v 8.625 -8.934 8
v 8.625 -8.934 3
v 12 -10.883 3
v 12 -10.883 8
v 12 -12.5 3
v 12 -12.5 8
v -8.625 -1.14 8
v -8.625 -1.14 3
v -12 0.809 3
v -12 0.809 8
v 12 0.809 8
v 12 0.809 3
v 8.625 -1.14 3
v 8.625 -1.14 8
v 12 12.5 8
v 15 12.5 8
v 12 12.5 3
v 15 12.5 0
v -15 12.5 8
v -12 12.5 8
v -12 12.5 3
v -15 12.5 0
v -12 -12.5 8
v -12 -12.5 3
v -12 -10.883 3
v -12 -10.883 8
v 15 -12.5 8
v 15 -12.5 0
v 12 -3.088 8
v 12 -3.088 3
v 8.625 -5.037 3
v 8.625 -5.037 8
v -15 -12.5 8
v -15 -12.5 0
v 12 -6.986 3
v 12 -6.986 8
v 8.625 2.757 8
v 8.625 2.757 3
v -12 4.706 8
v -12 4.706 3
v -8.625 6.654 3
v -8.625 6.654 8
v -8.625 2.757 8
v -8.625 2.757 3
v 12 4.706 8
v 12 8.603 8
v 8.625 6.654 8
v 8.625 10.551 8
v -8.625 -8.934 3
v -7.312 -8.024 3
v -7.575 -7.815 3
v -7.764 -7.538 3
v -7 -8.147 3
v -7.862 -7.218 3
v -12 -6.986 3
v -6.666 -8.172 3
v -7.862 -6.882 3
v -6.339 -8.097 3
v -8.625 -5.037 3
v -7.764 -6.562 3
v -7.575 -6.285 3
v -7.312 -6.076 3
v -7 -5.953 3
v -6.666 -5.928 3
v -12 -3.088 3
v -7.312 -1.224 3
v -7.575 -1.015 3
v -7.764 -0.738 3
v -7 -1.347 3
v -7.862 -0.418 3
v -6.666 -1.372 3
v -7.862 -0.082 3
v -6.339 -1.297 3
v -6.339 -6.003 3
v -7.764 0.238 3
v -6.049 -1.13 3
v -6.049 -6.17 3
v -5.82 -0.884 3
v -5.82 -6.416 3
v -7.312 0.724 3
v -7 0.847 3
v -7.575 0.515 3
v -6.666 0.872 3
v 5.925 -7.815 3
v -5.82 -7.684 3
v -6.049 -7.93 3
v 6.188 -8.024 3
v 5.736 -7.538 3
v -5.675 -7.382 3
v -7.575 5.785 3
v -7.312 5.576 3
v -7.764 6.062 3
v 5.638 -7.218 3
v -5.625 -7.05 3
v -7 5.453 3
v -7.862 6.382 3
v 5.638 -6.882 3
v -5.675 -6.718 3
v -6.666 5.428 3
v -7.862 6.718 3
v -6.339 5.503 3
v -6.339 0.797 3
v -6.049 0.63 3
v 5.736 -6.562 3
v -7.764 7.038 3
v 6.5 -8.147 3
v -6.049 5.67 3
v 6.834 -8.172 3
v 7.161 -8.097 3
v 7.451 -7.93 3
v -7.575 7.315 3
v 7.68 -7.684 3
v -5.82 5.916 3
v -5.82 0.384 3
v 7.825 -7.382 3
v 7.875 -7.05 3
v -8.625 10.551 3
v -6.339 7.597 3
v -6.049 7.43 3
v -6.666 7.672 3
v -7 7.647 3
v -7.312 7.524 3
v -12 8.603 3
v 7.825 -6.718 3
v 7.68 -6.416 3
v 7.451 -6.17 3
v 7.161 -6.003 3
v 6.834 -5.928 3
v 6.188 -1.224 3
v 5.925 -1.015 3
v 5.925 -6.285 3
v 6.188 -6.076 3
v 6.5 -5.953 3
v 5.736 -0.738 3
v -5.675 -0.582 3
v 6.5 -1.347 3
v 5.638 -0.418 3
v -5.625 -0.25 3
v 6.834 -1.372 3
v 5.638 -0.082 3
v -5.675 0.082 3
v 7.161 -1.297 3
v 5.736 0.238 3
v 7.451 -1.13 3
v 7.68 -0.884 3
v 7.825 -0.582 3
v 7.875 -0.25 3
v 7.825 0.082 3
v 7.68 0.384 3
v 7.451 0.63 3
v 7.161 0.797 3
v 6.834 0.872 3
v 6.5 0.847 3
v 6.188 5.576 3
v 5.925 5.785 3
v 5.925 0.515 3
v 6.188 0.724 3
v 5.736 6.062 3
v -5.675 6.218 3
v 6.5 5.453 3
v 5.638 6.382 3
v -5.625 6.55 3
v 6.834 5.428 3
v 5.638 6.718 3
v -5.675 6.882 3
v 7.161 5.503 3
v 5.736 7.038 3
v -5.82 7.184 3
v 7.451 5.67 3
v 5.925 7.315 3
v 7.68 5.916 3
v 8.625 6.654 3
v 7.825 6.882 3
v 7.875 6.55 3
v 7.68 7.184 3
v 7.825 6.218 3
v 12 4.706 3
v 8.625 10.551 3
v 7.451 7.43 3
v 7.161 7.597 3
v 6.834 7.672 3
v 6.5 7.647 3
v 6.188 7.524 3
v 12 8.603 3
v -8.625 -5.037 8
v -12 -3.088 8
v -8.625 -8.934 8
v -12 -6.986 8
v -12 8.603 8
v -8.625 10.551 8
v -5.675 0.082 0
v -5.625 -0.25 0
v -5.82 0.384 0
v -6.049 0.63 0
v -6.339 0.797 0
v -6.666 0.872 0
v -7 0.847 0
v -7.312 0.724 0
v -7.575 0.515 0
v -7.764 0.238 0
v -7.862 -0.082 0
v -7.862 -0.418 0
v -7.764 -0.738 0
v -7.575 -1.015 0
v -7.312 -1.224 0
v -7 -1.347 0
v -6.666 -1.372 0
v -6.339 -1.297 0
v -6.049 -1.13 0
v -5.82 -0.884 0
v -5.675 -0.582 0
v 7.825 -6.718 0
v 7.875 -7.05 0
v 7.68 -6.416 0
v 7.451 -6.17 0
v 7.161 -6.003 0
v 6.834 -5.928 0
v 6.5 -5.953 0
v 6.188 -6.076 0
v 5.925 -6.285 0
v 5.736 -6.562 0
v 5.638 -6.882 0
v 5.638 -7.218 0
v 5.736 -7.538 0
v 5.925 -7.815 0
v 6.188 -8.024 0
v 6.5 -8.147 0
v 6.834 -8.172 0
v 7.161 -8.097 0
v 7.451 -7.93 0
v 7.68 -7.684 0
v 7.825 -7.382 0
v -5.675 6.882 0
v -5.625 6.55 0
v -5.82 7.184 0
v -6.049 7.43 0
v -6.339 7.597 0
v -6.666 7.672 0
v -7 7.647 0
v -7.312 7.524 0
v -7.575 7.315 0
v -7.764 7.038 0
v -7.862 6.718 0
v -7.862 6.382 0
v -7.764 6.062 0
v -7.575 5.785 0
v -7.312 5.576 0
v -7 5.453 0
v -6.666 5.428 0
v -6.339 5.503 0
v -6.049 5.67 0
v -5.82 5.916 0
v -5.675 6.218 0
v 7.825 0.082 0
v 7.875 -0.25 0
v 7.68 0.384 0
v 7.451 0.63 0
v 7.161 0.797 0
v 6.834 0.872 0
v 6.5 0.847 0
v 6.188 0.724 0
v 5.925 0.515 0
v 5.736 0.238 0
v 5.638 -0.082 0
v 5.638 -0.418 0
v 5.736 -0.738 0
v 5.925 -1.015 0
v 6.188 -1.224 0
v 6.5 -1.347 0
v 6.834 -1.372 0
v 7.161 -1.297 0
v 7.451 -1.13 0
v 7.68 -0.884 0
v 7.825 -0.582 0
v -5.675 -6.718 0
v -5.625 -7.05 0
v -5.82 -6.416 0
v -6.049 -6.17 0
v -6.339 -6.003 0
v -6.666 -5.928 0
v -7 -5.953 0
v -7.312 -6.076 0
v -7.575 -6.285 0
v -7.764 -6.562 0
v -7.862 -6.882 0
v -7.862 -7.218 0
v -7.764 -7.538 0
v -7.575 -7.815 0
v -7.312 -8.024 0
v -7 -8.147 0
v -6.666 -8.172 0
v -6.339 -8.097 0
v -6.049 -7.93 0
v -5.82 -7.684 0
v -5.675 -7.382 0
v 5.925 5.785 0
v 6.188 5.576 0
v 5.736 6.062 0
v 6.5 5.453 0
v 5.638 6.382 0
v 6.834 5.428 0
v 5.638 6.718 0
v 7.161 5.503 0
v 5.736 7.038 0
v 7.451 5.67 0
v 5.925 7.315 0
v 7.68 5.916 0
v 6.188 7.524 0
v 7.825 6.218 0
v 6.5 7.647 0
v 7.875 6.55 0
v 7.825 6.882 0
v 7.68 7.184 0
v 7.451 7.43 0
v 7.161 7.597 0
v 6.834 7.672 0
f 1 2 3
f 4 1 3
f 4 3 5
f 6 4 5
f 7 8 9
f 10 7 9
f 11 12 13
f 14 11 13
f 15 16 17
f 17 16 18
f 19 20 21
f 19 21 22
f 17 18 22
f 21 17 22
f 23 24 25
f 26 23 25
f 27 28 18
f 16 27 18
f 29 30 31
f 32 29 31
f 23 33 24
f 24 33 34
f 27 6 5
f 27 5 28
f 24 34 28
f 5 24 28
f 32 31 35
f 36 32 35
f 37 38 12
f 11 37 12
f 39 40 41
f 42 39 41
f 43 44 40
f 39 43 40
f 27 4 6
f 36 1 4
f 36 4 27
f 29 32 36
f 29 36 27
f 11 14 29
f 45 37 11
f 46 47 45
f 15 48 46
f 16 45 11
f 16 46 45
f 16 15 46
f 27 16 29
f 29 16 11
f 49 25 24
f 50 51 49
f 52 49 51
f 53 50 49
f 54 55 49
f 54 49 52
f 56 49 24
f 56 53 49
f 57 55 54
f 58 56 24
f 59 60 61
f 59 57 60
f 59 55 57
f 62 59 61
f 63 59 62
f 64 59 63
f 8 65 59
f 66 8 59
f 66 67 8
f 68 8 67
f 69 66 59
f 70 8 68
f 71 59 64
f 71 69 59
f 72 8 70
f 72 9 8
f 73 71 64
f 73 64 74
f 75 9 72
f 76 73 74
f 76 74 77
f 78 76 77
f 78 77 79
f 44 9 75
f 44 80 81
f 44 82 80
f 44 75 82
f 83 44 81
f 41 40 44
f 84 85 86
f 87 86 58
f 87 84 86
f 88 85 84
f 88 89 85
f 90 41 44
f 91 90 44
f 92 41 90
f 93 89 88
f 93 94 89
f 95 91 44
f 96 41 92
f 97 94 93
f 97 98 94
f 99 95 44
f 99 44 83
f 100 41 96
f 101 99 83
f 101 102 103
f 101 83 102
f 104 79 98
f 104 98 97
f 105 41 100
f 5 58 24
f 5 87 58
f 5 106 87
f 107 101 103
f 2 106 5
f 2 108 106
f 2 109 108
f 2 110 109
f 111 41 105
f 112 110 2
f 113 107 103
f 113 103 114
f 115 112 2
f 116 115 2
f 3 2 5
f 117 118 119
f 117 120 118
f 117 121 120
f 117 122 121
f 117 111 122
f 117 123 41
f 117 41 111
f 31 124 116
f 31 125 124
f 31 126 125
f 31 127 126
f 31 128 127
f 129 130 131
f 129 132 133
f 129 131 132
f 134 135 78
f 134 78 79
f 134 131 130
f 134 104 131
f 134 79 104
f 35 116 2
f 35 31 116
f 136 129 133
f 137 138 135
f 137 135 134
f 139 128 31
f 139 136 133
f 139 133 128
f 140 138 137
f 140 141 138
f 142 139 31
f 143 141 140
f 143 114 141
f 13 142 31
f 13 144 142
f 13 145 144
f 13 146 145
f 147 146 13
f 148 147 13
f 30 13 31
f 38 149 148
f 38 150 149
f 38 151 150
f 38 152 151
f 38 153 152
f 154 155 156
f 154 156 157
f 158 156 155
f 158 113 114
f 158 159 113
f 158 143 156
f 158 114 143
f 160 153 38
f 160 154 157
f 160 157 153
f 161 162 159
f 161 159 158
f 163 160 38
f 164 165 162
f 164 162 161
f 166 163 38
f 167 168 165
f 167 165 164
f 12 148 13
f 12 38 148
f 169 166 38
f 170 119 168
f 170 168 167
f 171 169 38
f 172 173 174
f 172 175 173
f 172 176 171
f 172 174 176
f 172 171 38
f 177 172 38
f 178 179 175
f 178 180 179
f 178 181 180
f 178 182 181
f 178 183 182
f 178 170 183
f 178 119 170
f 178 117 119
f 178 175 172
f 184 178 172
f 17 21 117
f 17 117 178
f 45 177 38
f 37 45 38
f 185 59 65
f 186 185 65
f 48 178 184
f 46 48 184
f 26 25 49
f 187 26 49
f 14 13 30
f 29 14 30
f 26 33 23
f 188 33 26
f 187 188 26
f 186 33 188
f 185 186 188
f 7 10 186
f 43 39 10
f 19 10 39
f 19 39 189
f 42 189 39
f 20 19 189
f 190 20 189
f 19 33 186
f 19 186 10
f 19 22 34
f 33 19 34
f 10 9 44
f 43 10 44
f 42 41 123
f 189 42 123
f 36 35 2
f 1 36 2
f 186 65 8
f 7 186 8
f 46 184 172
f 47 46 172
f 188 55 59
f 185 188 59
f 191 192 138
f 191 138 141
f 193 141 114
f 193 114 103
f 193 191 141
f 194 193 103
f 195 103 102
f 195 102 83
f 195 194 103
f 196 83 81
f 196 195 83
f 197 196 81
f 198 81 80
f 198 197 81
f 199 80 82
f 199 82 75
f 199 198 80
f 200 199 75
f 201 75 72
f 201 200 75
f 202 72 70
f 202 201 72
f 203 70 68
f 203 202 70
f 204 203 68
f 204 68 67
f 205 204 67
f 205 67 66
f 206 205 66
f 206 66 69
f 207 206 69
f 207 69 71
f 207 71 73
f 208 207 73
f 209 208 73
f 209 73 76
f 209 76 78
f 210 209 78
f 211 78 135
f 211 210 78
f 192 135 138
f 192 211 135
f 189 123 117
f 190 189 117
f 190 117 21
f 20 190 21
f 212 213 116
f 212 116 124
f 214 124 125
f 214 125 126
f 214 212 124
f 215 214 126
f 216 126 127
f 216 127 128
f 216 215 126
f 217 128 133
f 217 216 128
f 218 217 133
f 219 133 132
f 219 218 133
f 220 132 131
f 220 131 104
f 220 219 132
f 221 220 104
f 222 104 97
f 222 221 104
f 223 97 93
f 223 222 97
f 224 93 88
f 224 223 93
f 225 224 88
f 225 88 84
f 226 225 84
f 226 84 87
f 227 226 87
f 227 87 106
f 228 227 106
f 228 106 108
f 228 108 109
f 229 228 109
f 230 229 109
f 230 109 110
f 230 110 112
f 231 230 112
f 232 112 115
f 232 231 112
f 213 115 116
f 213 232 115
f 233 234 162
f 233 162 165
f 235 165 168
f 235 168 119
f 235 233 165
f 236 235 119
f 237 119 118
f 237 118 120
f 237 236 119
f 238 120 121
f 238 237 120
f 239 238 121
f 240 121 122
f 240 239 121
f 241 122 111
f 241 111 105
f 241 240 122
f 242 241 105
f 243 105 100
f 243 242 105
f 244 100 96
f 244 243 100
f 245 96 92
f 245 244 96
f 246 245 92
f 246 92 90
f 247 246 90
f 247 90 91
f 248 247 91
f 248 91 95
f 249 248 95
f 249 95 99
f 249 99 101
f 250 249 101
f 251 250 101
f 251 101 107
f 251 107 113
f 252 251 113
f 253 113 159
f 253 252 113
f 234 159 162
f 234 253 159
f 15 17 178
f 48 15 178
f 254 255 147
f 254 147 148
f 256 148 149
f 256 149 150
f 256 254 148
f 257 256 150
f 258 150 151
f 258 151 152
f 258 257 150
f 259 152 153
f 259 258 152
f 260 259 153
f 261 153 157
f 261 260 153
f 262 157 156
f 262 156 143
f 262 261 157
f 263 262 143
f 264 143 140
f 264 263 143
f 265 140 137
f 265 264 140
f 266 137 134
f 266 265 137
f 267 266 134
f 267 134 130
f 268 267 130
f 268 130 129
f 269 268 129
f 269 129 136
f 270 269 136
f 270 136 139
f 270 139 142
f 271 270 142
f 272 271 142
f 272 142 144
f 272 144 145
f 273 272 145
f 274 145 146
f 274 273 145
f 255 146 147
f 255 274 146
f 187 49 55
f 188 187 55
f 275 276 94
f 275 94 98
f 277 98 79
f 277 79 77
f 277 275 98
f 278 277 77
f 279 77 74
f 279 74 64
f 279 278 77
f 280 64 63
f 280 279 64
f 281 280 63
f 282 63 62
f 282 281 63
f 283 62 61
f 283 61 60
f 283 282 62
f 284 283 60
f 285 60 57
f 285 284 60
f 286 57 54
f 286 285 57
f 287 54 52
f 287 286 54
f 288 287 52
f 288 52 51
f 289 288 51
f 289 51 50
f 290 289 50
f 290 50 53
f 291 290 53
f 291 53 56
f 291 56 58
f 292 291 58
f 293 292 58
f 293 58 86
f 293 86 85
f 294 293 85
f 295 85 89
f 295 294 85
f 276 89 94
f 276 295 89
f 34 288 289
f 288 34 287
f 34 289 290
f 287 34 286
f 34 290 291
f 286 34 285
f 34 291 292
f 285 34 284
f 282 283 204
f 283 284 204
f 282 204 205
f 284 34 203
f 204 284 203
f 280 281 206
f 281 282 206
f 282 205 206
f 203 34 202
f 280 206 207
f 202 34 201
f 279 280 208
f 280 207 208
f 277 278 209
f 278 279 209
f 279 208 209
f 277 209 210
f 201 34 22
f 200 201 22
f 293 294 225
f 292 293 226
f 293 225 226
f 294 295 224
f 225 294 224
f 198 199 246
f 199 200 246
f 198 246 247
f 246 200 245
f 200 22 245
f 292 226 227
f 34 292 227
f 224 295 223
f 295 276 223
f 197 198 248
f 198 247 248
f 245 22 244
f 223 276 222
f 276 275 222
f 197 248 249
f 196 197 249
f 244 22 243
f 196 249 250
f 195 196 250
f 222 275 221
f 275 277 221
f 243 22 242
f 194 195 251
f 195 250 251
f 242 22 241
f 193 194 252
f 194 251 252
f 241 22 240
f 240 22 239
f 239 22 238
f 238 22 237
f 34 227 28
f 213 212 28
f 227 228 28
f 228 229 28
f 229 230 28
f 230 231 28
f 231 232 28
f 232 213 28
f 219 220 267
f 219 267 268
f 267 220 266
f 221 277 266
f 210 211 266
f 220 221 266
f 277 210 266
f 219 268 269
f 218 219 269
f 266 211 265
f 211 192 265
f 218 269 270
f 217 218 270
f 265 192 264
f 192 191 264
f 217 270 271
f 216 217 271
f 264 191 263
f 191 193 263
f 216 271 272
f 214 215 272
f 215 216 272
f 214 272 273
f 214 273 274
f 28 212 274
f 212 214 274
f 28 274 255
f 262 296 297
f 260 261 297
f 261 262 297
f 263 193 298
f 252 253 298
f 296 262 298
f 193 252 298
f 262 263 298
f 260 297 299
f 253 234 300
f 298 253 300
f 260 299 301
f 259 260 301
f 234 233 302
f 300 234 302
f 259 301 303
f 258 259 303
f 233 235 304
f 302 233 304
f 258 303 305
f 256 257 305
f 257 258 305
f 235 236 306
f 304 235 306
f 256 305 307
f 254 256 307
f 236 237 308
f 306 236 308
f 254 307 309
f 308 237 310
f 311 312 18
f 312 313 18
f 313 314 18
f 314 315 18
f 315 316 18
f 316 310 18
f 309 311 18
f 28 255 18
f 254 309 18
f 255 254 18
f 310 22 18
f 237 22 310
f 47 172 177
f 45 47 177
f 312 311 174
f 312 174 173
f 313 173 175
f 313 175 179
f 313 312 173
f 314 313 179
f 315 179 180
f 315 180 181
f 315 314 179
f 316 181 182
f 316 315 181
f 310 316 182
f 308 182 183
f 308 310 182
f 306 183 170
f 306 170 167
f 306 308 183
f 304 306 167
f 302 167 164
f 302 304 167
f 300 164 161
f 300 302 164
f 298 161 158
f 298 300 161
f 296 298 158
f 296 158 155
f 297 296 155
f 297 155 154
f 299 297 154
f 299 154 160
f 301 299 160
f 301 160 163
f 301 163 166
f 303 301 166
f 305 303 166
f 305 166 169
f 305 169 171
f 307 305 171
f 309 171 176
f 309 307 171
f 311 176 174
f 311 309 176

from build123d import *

# Parameters (mm, degrees)
SKETCH1_W           = 24
SKETCH1_H           = 25
SKETCH1_R           = 1.125
BOSS_EXTRUDE1_DEPTH = 3
BOSS_EXTRUDE2_DEPTH = 8


with BuildPart() as part:
    # Sketch1 → Boss-Extrude1 (new body)
    with BuildSketch(Plane.XY):
        Rectangle(SKETCH1_W, SKETCH1_H)
        with Locations((-6.75, 6.55)):
            Circle(SKETCH1_R, mode=Mode.SUBTRACT)
        with Locations((-6.75, -0.25)):
            Circle(SKETCH1_R, mode=Mode.SUBTRACT)
        with Locations((-6.75, -7.05)):
            Circle(SKETCH1_R, mode=Mode.SUBTRACT)
        with Locations((6.75, -7.05)):
            Circle(SKETCH1_R, mode=Mode.SUBTRACT)
        with Locations((6.75, -0.25)):
            Circle(SKETCH1_R, mode=Mode.SUBTRACT)
        with Locations((6.75, 6.55)):
            Circle(SKETCH1_R, mode=Mode.SUBTRACT)
    extrude(amount=BOSS_EXTRUDE1_DEPTH)

    # Sketch2 → Boss-Extrude2 (add)
    with BuildSketch(Plane.XY):
        Polygon((-12, 12.5), (-15, 12.5), (-15, -12.5), (-12, -12.5), (-12, -10.882685902), (-8.625, -8.934128744), (-12, -6.985571585), (-8.625, -5.037014427), (-12, -3.088457268), (-8.625, -1.13990011), (-12, 0.808657049), (-8.625, 2.757214207), (-12, 4.705771366), (-8.625, 6.654328524), (-12, 8.602885683), (-8.625, 10.551442841), align=None)
        Polygon((12, -3.088457268), (8.625, -5.037014427), (12, -6.985571585), (8.625, -8.934128744), (12, -10.882685902), (12, -12.5), (15, -12.5), (15, 12.5), (12, 12.5), (8.625, 10.551442841), (12, 8.602885683), (8.625, 6.654328524), (12, 4.705771366), (8.625, 2.757214207), (12, 0.808657049), (8.625, -1.13990011), align=None)
    extrude(amount=BOSS_EXTRUDE2_DEPTH)


solid = part.part
